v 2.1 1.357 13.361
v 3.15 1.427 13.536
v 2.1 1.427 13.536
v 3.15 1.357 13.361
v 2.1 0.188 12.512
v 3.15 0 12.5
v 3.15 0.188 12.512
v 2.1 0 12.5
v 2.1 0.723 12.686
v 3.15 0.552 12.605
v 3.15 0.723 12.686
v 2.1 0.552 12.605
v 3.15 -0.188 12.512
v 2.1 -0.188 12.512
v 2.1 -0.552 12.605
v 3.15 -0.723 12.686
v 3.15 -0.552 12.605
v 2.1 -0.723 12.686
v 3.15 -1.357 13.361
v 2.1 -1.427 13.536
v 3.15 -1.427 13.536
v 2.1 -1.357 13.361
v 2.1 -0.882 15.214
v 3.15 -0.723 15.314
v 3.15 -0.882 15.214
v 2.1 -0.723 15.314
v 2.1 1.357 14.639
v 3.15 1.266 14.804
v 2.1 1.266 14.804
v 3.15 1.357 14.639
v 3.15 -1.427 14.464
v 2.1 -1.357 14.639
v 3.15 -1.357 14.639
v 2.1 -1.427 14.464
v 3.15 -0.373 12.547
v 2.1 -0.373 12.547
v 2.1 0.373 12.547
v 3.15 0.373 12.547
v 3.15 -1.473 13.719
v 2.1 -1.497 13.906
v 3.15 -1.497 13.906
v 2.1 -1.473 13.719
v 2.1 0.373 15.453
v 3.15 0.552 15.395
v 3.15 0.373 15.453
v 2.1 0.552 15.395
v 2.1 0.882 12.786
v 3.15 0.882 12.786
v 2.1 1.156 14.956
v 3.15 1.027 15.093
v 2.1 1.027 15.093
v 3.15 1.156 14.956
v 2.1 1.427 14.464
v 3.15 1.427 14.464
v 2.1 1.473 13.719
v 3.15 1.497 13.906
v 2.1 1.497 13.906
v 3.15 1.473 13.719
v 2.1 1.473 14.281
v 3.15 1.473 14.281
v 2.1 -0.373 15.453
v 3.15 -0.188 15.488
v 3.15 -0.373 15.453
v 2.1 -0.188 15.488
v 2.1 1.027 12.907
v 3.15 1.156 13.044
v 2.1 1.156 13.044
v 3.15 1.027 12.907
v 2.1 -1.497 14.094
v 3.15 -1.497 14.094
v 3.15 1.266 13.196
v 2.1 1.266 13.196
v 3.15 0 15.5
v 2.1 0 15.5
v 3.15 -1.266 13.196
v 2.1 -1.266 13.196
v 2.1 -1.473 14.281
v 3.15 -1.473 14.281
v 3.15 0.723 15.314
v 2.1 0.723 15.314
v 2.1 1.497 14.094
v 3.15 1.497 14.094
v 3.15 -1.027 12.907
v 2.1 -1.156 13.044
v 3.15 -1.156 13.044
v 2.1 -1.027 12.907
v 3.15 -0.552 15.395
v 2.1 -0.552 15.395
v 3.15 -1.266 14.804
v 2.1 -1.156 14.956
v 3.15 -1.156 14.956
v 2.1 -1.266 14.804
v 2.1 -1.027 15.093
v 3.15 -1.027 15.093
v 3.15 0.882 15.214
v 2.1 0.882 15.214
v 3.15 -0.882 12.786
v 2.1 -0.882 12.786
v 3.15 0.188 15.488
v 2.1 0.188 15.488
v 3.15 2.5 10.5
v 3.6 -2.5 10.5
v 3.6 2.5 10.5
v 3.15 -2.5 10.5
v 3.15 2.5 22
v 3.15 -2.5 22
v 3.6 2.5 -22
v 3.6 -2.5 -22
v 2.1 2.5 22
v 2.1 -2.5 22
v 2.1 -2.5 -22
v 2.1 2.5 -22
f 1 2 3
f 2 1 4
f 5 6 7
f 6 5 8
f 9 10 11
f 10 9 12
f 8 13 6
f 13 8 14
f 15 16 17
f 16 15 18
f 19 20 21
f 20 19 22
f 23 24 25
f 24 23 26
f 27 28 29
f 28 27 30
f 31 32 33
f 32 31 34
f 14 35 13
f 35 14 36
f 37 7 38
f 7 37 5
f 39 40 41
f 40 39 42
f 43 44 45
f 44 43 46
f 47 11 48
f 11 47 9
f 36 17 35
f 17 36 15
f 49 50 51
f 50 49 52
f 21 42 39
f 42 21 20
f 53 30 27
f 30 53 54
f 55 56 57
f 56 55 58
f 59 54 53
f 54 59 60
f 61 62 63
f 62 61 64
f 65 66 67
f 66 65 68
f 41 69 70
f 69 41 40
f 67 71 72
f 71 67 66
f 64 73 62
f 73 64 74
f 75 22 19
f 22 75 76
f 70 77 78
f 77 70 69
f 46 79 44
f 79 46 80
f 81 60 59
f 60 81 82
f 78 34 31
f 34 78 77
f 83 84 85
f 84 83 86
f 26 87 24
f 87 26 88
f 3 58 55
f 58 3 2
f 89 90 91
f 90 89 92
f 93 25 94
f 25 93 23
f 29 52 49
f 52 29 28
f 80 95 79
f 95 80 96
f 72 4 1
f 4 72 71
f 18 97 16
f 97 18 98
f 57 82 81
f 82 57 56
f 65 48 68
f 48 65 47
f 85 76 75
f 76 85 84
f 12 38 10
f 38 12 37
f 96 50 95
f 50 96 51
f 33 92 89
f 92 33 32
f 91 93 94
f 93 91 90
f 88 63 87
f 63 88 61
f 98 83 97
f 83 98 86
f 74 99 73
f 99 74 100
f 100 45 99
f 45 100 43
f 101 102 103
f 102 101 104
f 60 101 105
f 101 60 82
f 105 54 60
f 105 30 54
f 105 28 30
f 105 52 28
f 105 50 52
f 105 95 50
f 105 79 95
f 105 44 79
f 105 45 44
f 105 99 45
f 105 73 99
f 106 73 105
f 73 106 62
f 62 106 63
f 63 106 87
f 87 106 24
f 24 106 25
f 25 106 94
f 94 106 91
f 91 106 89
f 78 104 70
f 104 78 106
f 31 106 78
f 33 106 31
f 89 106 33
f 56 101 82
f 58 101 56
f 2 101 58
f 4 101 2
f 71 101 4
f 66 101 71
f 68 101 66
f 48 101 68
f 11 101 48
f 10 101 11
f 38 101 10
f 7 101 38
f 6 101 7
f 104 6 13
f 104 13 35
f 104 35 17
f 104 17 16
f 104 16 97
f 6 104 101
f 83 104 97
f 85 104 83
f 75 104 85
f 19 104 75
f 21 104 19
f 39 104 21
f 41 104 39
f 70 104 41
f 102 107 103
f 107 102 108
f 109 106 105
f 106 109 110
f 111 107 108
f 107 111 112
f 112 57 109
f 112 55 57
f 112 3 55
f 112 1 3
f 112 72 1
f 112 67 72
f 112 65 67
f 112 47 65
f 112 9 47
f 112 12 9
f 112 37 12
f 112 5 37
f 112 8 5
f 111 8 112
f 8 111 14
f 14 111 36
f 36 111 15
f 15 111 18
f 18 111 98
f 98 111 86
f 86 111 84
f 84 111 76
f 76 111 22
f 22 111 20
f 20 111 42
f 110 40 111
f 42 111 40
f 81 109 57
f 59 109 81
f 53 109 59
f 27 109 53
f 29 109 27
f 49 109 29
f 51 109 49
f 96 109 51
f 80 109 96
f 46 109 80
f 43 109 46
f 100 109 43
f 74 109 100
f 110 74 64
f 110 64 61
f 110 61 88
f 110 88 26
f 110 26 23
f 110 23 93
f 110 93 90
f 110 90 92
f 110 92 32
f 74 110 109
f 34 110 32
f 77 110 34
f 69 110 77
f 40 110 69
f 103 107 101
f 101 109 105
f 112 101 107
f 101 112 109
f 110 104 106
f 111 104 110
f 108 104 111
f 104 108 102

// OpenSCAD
//globals
$fn=50;
obj_round = 50;
twist_ratio = 1.62; // based on obj_height = 50 / twist=81
obj_height = 44;
twist=obj_height * twist_ratio;
shaft = 5.24;
d_shaft = true;

module master(){
	module rightGear(twist) {
		rotate([0, 0, -25]) {
			translate([0, 0, obj_height/4])
			linear_extrude(height = obj_height/2, center = true, twist = twist, convexity = 10)
			    import (file = "small_gear.dxf", layer = "Layer_1");
			circle(r = 1);
		}
	}

    module gearObject() {

        module gear() {

            union() {
                rightGear(twist);
                mirror([0,0,1]) rightGear(twist);
                
                translate([0,0,10])
                cylinder(d=16.2,h=12);
            }

        }

        module hole() {
            cylinder(d=shaft, h=obj_height*2.1, center=true);
        }

        module bolt_hole() {
            translate([0, 0, 14])
           {
               //translate([5,0,0]) rotate([0,90,0]) cylinder(d=6.8, h=10);
               rotate([0,90,0]) cylinder(d=3, h=10);
               //translate([1.5,0,6.8]) rotate([0,45,0]) translate([10,0,50]) cube([10,4,100],center=true);
               translate([4.5,0,25-3.5]) cube([2.7,5.7,50],center=true);
           }
        }

        module bone() {
            difference() {
                gear(twist=twist);
                hole();
            }
        }
        difference()
        {
            union() {
                if (d_shaft == true)
                {
                    translate([5.6/2 - 0.7, -2.5, -obj_height/2]) cube([1.5,5,obj_height], center=false);
                }
                bone();
            }
            bolt_hole();
            rotate([0,0,360/3]) bolt_hole();
            rotate([0,0,2*360/3]) bolt_hole();
            
            /*
            translate([0,0,obj_height/2+12-6.8/2])
            difference()
            {
                cylinder(d=30,h=obj_height,center=true);
                cylinder(d=10.6,h=obj_height+1,center=true);
            }
            */
        }
    }
gearObject();
}

intersection(){
    master();
}
